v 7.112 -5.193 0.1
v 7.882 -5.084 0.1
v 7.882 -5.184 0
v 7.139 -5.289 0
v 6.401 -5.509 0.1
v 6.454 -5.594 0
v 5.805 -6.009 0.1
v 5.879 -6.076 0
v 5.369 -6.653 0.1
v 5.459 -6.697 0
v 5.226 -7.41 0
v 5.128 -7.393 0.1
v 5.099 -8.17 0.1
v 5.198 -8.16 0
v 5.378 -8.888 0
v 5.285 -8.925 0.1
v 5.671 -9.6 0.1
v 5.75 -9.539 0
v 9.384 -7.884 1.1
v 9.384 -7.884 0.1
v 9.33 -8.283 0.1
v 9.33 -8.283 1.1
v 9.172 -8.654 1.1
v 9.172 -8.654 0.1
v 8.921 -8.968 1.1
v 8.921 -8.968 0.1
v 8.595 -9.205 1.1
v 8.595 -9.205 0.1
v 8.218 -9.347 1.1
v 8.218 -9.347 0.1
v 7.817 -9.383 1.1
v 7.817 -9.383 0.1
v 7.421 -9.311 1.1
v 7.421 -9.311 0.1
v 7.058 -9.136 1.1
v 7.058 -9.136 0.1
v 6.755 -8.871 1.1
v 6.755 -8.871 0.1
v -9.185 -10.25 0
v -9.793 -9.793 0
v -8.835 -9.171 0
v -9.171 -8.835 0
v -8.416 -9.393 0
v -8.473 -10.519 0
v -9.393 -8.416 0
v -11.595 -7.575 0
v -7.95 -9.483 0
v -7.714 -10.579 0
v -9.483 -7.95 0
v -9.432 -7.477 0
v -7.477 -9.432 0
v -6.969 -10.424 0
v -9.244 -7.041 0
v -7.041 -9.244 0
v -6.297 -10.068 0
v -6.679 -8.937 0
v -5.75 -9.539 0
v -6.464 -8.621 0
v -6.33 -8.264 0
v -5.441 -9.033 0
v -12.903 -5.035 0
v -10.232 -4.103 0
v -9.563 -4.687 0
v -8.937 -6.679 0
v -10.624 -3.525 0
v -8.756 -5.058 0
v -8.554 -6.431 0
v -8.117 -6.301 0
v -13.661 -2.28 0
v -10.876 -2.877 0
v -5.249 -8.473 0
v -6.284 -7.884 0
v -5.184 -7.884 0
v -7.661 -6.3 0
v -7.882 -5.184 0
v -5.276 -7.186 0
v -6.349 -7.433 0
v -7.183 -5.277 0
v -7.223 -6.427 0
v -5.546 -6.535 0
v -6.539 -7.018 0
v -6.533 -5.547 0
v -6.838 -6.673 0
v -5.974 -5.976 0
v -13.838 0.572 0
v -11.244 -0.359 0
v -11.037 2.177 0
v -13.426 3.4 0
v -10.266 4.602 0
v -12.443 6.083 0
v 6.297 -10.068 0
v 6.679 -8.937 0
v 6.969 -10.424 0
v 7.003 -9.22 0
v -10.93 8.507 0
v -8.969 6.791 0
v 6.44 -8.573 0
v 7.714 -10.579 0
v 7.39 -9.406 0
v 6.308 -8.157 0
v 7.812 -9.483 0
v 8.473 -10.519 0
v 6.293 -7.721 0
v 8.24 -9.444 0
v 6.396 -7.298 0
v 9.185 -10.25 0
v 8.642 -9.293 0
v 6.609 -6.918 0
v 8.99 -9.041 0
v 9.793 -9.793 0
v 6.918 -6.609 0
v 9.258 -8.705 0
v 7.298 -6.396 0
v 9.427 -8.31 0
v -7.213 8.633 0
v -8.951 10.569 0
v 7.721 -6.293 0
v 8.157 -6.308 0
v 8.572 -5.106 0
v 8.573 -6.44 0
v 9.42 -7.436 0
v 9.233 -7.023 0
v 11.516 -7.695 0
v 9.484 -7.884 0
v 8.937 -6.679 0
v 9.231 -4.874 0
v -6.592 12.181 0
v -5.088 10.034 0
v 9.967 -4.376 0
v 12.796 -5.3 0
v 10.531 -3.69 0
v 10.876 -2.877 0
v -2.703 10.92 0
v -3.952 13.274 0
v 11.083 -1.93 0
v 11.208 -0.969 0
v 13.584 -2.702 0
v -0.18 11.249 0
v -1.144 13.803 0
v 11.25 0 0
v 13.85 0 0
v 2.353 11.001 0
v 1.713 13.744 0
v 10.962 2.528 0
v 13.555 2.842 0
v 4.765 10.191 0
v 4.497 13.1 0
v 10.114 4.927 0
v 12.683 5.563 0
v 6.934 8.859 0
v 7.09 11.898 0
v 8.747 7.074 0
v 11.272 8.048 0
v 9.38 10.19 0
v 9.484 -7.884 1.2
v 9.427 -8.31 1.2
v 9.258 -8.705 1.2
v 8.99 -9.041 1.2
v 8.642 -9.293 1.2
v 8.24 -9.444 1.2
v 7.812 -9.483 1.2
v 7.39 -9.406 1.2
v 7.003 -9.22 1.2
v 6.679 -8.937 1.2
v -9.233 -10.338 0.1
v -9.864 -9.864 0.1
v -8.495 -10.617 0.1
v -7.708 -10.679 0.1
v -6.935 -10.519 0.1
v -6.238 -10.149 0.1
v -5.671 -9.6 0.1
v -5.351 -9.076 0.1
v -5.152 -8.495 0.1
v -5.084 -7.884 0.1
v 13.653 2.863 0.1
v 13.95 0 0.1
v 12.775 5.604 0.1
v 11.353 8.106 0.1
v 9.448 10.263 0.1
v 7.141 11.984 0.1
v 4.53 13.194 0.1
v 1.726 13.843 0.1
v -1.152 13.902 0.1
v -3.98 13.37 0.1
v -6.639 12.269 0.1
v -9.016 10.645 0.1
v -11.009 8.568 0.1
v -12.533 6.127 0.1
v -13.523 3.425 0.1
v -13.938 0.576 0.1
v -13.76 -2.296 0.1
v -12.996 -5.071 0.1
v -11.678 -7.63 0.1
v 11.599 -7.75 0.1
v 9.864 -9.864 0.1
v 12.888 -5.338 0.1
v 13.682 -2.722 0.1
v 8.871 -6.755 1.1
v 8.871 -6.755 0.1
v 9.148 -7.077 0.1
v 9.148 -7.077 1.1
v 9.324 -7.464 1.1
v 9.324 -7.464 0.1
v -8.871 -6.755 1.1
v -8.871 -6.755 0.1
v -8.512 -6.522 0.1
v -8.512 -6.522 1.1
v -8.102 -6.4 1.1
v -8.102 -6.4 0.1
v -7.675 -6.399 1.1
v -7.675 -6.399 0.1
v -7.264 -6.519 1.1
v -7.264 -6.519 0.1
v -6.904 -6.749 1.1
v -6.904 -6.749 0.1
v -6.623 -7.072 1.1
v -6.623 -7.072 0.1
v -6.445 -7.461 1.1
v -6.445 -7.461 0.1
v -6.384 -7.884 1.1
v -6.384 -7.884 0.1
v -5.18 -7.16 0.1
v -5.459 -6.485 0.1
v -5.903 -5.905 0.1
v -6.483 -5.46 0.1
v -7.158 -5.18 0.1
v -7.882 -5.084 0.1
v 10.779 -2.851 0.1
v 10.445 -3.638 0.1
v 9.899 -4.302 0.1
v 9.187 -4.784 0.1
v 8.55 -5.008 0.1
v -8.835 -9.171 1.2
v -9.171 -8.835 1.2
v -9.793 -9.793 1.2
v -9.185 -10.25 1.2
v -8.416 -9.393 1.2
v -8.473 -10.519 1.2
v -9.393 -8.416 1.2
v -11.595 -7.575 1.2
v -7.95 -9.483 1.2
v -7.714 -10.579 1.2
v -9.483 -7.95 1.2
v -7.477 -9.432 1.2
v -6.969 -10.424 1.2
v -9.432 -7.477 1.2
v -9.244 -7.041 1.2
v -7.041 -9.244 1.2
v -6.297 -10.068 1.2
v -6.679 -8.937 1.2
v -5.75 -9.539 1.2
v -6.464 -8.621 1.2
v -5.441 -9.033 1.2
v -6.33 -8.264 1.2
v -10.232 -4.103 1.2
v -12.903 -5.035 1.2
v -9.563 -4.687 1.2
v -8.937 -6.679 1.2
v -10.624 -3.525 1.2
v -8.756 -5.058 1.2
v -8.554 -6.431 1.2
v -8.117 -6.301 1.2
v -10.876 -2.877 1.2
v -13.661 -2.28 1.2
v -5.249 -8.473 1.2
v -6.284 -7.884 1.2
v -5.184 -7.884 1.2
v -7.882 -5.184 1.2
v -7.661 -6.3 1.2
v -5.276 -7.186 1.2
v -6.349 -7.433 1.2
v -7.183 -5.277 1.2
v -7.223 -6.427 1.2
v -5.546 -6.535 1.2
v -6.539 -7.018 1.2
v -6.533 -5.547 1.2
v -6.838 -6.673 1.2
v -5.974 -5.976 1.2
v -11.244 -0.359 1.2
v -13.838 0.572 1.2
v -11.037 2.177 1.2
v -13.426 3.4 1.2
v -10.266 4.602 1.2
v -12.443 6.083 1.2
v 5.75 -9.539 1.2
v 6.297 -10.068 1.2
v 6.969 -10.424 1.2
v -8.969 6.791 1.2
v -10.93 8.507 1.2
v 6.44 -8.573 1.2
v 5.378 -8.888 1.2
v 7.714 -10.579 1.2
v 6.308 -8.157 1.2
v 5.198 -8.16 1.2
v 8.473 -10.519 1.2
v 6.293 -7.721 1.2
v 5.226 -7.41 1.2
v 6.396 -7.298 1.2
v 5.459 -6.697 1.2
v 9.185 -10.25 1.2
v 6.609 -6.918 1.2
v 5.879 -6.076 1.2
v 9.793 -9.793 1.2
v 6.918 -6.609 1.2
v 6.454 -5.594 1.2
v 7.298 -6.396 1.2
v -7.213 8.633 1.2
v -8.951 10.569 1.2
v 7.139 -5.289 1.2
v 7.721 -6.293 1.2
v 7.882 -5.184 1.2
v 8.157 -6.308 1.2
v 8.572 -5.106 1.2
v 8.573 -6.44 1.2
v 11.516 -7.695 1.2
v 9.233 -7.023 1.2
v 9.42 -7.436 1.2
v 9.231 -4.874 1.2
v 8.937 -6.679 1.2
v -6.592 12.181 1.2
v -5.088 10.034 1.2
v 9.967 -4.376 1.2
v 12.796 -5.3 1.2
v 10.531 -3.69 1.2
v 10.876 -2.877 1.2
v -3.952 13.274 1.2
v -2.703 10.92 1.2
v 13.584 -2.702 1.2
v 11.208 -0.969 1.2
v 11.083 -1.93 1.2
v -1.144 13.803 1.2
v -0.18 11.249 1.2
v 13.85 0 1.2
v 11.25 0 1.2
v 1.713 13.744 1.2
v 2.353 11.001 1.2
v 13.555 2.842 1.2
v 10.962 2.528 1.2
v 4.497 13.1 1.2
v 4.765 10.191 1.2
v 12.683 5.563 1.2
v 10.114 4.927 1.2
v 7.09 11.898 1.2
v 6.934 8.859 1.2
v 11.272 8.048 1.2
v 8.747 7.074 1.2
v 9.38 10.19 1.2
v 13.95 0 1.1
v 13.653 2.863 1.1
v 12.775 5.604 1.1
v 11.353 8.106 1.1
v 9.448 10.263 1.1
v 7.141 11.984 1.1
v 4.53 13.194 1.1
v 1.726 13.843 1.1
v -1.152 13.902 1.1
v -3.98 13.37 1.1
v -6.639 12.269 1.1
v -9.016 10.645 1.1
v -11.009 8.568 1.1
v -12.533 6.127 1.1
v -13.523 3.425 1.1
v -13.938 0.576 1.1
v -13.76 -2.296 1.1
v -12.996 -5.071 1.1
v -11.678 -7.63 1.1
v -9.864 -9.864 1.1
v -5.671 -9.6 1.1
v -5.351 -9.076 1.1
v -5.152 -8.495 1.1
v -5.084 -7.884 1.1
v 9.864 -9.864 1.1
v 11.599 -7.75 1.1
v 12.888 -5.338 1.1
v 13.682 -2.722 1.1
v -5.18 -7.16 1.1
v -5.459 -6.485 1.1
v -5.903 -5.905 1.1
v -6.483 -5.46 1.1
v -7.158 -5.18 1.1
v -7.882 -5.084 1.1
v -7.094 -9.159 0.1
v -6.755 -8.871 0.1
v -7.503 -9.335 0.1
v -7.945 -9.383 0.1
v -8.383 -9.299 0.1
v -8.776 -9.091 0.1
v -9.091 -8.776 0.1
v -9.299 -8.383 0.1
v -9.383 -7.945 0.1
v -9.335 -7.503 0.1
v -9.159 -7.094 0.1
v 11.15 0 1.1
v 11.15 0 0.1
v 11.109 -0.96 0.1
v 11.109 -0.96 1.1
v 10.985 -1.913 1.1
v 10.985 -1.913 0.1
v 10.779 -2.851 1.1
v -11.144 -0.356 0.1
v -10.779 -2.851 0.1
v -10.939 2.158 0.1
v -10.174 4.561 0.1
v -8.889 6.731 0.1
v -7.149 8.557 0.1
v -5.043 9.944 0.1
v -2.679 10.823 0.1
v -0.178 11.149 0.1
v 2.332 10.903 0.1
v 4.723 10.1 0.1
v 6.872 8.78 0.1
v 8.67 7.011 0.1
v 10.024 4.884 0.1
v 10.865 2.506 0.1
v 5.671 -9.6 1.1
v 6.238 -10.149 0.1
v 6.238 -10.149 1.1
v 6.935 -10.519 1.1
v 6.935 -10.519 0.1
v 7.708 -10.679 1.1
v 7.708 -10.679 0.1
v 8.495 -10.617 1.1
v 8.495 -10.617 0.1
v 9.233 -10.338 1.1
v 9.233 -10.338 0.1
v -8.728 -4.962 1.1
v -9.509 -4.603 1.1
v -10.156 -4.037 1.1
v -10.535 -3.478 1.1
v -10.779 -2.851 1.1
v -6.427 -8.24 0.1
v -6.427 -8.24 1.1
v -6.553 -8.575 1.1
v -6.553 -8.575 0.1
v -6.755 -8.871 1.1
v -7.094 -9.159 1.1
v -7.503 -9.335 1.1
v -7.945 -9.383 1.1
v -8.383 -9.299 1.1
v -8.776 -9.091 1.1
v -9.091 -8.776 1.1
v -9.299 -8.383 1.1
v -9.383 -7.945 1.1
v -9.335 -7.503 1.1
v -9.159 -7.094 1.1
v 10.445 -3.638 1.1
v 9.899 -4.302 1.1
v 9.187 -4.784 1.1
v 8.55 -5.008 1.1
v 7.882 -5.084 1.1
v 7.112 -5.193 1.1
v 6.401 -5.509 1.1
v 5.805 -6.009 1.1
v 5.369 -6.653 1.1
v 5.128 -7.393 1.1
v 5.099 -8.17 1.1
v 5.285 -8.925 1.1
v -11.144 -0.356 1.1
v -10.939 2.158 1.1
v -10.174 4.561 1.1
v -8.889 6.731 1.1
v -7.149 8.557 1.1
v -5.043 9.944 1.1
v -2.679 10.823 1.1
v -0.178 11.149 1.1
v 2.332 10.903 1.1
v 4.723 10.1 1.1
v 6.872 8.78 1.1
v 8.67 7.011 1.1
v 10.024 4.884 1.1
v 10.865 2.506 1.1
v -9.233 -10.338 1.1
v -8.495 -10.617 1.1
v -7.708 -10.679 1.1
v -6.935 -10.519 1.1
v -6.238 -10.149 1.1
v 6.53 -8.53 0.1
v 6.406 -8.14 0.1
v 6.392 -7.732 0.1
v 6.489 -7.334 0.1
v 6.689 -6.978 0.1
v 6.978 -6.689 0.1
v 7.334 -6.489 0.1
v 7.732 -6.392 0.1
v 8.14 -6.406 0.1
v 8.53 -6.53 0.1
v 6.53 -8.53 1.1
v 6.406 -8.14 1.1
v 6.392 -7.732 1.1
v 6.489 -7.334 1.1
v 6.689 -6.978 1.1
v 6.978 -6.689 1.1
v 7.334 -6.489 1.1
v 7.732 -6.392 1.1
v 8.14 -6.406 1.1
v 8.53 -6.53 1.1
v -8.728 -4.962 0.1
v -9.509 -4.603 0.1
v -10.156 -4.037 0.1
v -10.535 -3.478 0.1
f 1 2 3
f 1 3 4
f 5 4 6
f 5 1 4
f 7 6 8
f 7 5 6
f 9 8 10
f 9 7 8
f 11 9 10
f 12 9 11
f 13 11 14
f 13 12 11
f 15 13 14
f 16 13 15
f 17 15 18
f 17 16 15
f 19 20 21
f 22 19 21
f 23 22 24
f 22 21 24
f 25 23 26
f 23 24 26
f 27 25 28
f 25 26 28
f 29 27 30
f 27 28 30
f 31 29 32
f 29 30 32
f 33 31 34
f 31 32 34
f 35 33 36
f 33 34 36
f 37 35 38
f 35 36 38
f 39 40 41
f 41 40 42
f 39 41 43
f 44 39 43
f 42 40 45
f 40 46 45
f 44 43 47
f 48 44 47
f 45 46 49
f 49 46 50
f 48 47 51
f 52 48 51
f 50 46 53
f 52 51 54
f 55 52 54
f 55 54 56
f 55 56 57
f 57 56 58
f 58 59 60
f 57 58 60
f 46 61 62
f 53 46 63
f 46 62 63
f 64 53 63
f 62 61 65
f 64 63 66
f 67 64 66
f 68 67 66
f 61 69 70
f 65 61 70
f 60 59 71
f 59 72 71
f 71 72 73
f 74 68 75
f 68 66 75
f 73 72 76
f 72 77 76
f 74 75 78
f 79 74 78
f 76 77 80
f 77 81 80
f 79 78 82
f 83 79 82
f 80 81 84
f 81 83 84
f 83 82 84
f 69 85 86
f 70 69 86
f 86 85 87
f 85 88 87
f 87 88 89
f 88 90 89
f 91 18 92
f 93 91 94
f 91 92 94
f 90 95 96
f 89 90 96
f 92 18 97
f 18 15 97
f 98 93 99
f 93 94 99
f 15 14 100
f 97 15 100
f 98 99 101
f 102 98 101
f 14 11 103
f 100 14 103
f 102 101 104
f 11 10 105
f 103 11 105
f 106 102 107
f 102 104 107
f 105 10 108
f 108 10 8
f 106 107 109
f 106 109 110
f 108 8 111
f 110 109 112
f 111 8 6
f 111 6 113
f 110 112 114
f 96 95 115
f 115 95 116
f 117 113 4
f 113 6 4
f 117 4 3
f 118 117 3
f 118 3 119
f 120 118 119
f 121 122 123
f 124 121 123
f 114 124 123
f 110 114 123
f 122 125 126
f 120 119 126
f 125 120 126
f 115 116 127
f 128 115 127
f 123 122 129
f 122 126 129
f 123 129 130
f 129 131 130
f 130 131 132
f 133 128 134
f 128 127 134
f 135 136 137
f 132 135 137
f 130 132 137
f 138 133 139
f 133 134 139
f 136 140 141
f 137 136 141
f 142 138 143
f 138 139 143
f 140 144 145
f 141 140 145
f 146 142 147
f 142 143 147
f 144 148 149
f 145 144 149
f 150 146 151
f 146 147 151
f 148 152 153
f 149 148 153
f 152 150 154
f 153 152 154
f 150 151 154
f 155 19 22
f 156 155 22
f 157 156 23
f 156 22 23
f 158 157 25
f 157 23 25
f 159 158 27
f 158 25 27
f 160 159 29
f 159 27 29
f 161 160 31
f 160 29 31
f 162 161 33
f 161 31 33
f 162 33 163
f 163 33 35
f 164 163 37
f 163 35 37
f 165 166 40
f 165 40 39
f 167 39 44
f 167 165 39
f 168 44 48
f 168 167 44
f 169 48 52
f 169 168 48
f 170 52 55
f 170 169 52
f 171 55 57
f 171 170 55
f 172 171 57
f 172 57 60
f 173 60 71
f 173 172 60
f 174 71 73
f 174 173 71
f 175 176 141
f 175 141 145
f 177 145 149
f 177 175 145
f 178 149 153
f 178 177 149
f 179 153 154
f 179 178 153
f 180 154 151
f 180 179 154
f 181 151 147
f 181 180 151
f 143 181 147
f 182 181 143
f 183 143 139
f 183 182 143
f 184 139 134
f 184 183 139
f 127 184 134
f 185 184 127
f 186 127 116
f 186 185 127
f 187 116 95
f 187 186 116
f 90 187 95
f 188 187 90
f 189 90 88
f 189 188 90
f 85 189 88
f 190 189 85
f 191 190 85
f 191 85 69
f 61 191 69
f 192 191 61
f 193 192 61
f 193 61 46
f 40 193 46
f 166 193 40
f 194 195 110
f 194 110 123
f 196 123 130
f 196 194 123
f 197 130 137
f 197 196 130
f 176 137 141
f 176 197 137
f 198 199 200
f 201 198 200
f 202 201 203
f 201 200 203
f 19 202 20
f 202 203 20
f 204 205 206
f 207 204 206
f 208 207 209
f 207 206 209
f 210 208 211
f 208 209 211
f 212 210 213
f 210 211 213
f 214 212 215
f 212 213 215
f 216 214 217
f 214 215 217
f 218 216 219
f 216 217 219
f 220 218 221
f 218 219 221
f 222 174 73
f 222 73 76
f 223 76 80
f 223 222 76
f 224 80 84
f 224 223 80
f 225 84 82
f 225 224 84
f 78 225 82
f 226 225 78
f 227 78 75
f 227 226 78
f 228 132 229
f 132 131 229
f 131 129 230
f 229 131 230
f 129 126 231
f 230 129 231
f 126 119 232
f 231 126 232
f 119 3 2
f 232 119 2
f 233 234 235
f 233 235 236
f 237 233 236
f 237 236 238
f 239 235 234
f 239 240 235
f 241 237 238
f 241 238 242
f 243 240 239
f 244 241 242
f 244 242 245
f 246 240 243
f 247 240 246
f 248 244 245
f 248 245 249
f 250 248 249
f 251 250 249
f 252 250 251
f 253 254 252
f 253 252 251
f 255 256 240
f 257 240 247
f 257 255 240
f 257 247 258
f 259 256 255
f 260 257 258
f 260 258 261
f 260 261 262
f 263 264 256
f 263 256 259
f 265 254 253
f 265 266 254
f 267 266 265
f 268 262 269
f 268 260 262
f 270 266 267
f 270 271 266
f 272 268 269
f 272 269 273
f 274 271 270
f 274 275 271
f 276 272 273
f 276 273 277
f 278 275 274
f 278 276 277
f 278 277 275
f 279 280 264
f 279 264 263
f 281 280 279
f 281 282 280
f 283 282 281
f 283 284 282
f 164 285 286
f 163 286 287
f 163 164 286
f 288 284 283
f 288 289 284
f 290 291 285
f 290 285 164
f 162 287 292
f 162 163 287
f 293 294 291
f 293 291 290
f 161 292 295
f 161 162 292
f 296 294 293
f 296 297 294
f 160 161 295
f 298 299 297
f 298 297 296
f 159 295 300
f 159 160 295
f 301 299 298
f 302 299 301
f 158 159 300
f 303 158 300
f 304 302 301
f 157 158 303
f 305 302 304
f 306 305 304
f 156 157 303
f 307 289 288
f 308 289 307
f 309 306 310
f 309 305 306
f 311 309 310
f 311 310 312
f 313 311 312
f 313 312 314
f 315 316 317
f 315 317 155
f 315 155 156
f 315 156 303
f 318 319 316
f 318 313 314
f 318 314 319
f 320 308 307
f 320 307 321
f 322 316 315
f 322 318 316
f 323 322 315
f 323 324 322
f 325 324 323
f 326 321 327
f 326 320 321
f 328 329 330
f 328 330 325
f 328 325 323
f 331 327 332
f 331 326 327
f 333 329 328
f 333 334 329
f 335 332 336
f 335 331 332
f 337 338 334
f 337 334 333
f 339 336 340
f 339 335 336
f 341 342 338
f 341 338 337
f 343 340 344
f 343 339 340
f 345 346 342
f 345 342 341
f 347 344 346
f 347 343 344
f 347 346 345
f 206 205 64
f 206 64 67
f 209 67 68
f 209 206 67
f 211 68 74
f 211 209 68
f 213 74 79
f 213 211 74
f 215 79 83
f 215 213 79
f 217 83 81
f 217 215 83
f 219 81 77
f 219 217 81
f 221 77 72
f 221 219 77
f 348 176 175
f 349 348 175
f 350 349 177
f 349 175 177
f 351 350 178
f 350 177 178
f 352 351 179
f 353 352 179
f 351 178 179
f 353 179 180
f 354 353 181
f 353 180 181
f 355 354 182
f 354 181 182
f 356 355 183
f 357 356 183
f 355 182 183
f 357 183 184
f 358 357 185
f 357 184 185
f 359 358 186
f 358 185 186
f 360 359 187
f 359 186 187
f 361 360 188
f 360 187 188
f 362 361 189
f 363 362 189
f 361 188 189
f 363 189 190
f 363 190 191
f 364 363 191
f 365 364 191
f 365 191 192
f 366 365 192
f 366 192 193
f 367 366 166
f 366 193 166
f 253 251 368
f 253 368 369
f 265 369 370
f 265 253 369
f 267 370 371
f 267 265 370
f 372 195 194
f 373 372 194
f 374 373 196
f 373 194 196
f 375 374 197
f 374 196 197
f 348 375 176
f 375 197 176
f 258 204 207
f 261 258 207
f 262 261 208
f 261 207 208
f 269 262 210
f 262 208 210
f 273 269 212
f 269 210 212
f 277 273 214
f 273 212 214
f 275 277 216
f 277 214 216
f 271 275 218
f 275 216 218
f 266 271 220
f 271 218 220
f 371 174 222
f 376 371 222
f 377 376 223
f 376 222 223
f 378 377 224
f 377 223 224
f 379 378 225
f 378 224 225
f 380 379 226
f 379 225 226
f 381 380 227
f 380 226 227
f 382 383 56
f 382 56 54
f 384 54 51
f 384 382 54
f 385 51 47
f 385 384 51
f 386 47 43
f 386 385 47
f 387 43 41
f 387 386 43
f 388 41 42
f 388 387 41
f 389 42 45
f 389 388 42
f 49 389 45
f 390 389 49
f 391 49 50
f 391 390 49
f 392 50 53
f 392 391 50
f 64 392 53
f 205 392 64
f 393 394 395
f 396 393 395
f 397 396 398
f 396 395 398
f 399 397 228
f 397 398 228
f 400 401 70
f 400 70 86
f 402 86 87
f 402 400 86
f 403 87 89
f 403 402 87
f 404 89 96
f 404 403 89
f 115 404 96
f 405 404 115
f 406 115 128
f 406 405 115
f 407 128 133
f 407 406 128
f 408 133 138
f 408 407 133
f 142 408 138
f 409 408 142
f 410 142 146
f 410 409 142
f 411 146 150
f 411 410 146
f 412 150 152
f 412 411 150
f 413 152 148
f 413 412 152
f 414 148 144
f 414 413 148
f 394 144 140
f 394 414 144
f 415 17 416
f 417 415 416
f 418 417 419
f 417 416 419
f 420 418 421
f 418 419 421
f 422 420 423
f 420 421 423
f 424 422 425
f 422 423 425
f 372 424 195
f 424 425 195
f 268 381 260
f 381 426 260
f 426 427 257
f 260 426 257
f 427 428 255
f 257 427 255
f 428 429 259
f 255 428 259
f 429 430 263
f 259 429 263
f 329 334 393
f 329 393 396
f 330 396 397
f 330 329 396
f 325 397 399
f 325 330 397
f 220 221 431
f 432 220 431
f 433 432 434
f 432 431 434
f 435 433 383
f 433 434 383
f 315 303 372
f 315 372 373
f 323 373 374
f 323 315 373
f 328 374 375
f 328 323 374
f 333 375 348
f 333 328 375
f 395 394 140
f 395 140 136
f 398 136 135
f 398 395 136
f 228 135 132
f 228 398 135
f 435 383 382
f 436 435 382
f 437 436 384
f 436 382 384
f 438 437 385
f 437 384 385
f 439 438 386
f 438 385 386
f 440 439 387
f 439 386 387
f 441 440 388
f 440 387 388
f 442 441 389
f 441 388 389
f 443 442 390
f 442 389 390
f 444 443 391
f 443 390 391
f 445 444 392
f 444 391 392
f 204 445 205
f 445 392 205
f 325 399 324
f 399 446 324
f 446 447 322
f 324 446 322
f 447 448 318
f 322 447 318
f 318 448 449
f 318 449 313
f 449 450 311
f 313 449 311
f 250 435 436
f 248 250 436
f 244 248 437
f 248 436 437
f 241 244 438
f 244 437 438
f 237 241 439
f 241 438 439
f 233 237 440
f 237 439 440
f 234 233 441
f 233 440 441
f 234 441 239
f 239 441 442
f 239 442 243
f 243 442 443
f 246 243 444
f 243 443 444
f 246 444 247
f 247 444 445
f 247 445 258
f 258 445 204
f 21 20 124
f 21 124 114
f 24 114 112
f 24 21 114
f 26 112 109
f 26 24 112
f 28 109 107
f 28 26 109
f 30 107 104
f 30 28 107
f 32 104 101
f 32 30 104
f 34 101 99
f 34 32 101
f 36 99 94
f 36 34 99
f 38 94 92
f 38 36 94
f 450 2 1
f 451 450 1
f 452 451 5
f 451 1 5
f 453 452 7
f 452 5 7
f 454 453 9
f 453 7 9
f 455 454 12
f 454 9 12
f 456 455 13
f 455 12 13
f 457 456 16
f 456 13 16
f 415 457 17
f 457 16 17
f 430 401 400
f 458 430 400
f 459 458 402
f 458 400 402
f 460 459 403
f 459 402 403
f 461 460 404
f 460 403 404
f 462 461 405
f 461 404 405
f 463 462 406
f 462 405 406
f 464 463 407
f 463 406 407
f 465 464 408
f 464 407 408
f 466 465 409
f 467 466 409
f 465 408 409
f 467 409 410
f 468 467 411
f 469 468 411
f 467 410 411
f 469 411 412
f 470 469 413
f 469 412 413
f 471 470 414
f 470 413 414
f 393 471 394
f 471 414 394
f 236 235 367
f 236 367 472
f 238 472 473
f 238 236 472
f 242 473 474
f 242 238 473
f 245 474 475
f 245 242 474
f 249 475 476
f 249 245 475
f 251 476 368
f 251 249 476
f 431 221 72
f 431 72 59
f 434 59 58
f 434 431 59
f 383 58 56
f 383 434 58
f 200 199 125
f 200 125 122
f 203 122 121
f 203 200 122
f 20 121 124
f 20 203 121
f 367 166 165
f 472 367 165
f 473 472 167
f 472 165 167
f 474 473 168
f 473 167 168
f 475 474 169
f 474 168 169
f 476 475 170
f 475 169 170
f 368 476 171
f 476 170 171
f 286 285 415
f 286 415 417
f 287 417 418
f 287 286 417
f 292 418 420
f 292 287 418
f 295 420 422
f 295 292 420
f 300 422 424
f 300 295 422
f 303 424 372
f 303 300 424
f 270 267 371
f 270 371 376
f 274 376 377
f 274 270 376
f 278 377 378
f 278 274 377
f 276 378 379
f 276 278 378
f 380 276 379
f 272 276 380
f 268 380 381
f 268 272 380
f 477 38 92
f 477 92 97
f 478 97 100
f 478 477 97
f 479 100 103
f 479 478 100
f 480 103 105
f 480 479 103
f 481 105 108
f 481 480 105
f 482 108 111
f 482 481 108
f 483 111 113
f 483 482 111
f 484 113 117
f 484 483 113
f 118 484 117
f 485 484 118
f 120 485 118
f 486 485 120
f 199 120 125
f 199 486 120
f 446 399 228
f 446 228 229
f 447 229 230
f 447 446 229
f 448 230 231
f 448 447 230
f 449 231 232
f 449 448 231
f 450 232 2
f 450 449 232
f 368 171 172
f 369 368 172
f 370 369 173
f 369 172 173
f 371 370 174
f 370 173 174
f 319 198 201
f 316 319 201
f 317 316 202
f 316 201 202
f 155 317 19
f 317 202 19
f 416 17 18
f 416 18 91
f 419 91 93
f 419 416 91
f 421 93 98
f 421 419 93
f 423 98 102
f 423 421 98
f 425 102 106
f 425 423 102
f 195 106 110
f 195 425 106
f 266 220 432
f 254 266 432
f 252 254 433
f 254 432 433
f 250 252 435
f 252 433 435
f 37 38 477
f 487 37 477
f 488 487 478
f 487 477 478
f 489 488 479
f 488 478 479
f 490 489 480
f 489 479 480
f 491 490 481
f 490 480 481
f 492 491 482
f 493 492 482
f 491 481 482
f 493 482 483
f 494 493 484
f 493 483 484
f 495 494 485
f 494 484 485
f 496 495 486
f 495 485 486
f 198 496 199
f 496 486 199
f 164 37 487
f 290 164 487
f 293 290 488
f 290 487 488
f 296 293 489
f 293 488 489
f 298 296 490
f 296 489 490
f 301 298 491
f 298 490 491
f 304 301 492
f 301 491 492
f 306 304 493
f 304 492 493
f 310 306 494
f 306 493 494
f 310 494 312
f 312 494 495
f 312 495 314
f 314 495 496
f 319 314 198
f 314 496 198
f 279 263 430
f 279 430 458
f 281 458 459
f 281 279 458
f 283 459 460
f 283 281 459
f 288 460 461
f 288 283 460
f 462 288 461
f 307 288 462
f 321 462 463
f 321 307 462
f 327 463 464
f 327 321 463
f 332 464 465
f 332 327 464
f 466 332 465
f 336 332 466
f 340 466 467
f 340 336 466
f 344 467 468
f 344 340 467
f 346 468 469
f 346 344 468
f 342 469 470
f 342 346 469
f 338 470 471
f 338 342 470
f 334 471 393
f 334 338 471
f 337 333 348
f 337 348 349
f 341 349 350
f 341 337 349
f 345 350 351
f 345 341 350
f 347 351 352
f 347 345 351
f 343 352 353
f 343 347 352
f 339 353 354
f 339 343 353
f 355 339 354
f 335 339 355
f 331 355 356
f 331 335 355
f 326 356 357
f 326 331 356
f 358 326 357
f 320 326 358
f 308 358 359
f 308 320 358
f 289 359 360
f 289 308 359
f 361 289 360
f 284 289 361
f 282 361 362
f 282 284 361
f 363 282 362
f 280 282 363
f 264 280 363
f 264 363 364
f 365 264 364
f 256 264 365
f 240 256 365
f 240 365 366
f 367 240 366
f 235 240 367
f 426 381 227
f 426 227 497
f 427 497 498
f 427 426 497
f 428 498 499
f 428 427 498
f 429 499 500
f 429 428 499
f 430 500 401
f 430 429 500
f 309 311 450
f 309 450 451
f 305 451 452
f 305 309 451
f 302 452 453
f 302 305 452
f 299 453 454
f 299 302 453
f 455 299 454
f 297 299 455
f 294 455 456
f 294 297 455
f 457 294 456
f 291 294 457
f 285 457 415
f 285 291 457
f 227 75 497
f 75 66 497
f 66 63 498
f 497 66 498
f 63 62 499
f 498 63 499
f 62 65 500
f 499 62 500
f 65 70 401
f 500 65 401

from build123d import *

# Parameters (mm, degrees)
F1_DEPTH = 1.2
F2_R     = 3
F3_SIZE  = 0.1


with BuildPart() as f1:
    # F0 (on Top) → F1 (new body)
    with BuildSketch(Plane.XY):
        with BuildLine():
            ThreePointArc((9.8641395976, -9.8641395976), (12.8881194785, -5.3384338815), (13.95, 0))
            ThreePointArc((13.95, 0), (-5.3384338815, 12.8881194785), (-9.8641395976, -9.8641395976))
            ThreePointArc((-9.8641395976, -9.8641395976), (-10.6786952908, -7.7081070294), (-9.5998734147, -5.6714134412))
            ThreePointArc((-9.5998734147, -5.6714134412), (-2.939720346, 10.7554890306), (11.15, 0))
            ThreePointArc((11.15, 0), (10.7554890306, -2.939720346), (9.5998734147, -5.6714134412))
            ThreePointArc((9.5998734147, -5.6714134412), (10.3985766909, -6.6521228911), (10.6842406102, -7.8842406102))
            ThreePointArc((10.6842406102, -7.8842406102), (10.4711033013, -8.9557542209), (9.8641395976, -9.8641395976))
        make_face()
        with BuildLine():
            ThreePointArc((-5.0842406102, -7.8842406102), (-6.6521228911, -5.3699045296), (-9.5998734147, -5.6714134412))
            ThreePointArc((-9.5998734147, -5.6714134412), (-9.251381225, -6.2237003004), (-8.8711537165, -6.7546377948))
            ThreePointArc((-8.8711537165, -6.7546377948), (-7.2639058858, -6.5185229126), (-6.3842406102, -7.8842406102))
            ThreePointArc((-6.3842406102, -7.8842406102), (-6.4798894748, -8.4113059652), (-6.7546377948, -8.8711537165))
            ThreePointArc((-6.7546377948, -8.8711537165), (-6.2237003004, -9.251381225), (-5.6714134412, -9.5998734147))
            ThreePointArc((-5.6714134412, -9.5998734147), (-5.2350977231, -8.7909059086), (-5.0842406102, -7.8842406102))
        make_face()
        with BuildLine():
            ThreePointArc((-9.5998734147, -5.6714134412), (-10.6786952908, -7.7081070294), (-9.8641395976, -9.8641395976))
            ThreePointArc((-9.8641395976, -9.8641395976), (-7.7081070294, -10.6786952908), (-5.6714134412, -9.5998734147))
            ThreePointArc((-5.6714134412, -9.5998734147), (-6.2237003004, -9.251381225), (-6.7546377948, -8.8711537165))
            ThreePointArc((-6.7546377948, -8.8711537165), (-8.944900782, -8.944900782), (-8.8711537165, -6.7546377948))
            ThreePointArc((-8.8711537165, -6.7546377948), (-9.251381225, -6.2237003004), (-9.5998734147, -5.6714134412))
        make_face()
        with BuildLine():
            ThreePointArc((9.5998734147, -5.6714134412), (5.9043416229, -5.9043416229), (5.6714134412, -9.5998734147))
            ThreePointArc((5.6714134412, -9.5998734147), (6.2237003004, -9.251381225), (6.7546377948, -8.8711537165))
            ThreePointArc((6.7546377948, -8.8711537165), (6.8235804385, -6.8235804385), (8.8711537165, -6.7546377948))
            ThreePointArc((8.8711537165, -6.7546377948), (9.251381225, -6.2237003004), (9.5998734147, -5.6714134412))
        make_face()
        with BuildLine():
            ThreePointArc((5.6714134412, -9.5998734147), (7.7081070294, -10.6786952908), (9.8641395976, -9.8641395976))
            ThreePointArc((9.8641395976, -9.8641395976), (10.4711033013, -8.9557542209), (10.6842406102, -7.8842406102))
            ThreePointArc((10.6842406102, -7.8842406102), (10.3985766909, -6.6521228911), (9.5998734147, -5.6714134412))
            ThreePointArc((9.5998734147, -5.6714134412), (9.251381225, -6.2237003004), (8.8711537165, -6.7546377948))
            ThreePointArc((8.8711537165, -6.7546377948), (9.2499583079, -7.2639058858), (9.3842406102, -7.8842406102))
            ThreePointArc((9.3842406102, -7.8842406102), (8.4113059652, -9.2885917457), (6.7546377948, -8.8711537165))
            ThreePointArc((6.7546377948, -8.8711537165), (6.2237003004, -9.251381225), (5.6714134412, -9.5998734147))
        make_face()
    extrude(amount=F1_DEPTH)

    # F2
    f2_edges = [f1.edges().sort_by_distance(p)[0] for p in [
        (-9.599873, -5.671413, 0.6),
        (9.599873, -5.671413, 0.6),
    ]]
    fillet(f2_edges, radius=F2_R)

    # F3
    f3_edges = [f1.edges().sort_by_distance(p)[0] for p in [
        (-5.297863, -8.956926, 1.2),
        (-9.710143, -4.460557, 1.2),
        (0, 13.95, 1.2),
        (0, 11.15, 1.2),
        (5.297863, -8.956926, 1.2),
        (9.710143, -4.460557, 1.2),
        (-6.897328, -9.013843, 1.2),
        (9.013843, -6.897328, 1.2),
        (0, 11.15, 0),
        (-6.897328, -9.013843, 0),
        (9.013843, -6.897328, 0),
    ]]
    chamfer(f3_edges, length=F3_SIZE)


solid = f1.part
